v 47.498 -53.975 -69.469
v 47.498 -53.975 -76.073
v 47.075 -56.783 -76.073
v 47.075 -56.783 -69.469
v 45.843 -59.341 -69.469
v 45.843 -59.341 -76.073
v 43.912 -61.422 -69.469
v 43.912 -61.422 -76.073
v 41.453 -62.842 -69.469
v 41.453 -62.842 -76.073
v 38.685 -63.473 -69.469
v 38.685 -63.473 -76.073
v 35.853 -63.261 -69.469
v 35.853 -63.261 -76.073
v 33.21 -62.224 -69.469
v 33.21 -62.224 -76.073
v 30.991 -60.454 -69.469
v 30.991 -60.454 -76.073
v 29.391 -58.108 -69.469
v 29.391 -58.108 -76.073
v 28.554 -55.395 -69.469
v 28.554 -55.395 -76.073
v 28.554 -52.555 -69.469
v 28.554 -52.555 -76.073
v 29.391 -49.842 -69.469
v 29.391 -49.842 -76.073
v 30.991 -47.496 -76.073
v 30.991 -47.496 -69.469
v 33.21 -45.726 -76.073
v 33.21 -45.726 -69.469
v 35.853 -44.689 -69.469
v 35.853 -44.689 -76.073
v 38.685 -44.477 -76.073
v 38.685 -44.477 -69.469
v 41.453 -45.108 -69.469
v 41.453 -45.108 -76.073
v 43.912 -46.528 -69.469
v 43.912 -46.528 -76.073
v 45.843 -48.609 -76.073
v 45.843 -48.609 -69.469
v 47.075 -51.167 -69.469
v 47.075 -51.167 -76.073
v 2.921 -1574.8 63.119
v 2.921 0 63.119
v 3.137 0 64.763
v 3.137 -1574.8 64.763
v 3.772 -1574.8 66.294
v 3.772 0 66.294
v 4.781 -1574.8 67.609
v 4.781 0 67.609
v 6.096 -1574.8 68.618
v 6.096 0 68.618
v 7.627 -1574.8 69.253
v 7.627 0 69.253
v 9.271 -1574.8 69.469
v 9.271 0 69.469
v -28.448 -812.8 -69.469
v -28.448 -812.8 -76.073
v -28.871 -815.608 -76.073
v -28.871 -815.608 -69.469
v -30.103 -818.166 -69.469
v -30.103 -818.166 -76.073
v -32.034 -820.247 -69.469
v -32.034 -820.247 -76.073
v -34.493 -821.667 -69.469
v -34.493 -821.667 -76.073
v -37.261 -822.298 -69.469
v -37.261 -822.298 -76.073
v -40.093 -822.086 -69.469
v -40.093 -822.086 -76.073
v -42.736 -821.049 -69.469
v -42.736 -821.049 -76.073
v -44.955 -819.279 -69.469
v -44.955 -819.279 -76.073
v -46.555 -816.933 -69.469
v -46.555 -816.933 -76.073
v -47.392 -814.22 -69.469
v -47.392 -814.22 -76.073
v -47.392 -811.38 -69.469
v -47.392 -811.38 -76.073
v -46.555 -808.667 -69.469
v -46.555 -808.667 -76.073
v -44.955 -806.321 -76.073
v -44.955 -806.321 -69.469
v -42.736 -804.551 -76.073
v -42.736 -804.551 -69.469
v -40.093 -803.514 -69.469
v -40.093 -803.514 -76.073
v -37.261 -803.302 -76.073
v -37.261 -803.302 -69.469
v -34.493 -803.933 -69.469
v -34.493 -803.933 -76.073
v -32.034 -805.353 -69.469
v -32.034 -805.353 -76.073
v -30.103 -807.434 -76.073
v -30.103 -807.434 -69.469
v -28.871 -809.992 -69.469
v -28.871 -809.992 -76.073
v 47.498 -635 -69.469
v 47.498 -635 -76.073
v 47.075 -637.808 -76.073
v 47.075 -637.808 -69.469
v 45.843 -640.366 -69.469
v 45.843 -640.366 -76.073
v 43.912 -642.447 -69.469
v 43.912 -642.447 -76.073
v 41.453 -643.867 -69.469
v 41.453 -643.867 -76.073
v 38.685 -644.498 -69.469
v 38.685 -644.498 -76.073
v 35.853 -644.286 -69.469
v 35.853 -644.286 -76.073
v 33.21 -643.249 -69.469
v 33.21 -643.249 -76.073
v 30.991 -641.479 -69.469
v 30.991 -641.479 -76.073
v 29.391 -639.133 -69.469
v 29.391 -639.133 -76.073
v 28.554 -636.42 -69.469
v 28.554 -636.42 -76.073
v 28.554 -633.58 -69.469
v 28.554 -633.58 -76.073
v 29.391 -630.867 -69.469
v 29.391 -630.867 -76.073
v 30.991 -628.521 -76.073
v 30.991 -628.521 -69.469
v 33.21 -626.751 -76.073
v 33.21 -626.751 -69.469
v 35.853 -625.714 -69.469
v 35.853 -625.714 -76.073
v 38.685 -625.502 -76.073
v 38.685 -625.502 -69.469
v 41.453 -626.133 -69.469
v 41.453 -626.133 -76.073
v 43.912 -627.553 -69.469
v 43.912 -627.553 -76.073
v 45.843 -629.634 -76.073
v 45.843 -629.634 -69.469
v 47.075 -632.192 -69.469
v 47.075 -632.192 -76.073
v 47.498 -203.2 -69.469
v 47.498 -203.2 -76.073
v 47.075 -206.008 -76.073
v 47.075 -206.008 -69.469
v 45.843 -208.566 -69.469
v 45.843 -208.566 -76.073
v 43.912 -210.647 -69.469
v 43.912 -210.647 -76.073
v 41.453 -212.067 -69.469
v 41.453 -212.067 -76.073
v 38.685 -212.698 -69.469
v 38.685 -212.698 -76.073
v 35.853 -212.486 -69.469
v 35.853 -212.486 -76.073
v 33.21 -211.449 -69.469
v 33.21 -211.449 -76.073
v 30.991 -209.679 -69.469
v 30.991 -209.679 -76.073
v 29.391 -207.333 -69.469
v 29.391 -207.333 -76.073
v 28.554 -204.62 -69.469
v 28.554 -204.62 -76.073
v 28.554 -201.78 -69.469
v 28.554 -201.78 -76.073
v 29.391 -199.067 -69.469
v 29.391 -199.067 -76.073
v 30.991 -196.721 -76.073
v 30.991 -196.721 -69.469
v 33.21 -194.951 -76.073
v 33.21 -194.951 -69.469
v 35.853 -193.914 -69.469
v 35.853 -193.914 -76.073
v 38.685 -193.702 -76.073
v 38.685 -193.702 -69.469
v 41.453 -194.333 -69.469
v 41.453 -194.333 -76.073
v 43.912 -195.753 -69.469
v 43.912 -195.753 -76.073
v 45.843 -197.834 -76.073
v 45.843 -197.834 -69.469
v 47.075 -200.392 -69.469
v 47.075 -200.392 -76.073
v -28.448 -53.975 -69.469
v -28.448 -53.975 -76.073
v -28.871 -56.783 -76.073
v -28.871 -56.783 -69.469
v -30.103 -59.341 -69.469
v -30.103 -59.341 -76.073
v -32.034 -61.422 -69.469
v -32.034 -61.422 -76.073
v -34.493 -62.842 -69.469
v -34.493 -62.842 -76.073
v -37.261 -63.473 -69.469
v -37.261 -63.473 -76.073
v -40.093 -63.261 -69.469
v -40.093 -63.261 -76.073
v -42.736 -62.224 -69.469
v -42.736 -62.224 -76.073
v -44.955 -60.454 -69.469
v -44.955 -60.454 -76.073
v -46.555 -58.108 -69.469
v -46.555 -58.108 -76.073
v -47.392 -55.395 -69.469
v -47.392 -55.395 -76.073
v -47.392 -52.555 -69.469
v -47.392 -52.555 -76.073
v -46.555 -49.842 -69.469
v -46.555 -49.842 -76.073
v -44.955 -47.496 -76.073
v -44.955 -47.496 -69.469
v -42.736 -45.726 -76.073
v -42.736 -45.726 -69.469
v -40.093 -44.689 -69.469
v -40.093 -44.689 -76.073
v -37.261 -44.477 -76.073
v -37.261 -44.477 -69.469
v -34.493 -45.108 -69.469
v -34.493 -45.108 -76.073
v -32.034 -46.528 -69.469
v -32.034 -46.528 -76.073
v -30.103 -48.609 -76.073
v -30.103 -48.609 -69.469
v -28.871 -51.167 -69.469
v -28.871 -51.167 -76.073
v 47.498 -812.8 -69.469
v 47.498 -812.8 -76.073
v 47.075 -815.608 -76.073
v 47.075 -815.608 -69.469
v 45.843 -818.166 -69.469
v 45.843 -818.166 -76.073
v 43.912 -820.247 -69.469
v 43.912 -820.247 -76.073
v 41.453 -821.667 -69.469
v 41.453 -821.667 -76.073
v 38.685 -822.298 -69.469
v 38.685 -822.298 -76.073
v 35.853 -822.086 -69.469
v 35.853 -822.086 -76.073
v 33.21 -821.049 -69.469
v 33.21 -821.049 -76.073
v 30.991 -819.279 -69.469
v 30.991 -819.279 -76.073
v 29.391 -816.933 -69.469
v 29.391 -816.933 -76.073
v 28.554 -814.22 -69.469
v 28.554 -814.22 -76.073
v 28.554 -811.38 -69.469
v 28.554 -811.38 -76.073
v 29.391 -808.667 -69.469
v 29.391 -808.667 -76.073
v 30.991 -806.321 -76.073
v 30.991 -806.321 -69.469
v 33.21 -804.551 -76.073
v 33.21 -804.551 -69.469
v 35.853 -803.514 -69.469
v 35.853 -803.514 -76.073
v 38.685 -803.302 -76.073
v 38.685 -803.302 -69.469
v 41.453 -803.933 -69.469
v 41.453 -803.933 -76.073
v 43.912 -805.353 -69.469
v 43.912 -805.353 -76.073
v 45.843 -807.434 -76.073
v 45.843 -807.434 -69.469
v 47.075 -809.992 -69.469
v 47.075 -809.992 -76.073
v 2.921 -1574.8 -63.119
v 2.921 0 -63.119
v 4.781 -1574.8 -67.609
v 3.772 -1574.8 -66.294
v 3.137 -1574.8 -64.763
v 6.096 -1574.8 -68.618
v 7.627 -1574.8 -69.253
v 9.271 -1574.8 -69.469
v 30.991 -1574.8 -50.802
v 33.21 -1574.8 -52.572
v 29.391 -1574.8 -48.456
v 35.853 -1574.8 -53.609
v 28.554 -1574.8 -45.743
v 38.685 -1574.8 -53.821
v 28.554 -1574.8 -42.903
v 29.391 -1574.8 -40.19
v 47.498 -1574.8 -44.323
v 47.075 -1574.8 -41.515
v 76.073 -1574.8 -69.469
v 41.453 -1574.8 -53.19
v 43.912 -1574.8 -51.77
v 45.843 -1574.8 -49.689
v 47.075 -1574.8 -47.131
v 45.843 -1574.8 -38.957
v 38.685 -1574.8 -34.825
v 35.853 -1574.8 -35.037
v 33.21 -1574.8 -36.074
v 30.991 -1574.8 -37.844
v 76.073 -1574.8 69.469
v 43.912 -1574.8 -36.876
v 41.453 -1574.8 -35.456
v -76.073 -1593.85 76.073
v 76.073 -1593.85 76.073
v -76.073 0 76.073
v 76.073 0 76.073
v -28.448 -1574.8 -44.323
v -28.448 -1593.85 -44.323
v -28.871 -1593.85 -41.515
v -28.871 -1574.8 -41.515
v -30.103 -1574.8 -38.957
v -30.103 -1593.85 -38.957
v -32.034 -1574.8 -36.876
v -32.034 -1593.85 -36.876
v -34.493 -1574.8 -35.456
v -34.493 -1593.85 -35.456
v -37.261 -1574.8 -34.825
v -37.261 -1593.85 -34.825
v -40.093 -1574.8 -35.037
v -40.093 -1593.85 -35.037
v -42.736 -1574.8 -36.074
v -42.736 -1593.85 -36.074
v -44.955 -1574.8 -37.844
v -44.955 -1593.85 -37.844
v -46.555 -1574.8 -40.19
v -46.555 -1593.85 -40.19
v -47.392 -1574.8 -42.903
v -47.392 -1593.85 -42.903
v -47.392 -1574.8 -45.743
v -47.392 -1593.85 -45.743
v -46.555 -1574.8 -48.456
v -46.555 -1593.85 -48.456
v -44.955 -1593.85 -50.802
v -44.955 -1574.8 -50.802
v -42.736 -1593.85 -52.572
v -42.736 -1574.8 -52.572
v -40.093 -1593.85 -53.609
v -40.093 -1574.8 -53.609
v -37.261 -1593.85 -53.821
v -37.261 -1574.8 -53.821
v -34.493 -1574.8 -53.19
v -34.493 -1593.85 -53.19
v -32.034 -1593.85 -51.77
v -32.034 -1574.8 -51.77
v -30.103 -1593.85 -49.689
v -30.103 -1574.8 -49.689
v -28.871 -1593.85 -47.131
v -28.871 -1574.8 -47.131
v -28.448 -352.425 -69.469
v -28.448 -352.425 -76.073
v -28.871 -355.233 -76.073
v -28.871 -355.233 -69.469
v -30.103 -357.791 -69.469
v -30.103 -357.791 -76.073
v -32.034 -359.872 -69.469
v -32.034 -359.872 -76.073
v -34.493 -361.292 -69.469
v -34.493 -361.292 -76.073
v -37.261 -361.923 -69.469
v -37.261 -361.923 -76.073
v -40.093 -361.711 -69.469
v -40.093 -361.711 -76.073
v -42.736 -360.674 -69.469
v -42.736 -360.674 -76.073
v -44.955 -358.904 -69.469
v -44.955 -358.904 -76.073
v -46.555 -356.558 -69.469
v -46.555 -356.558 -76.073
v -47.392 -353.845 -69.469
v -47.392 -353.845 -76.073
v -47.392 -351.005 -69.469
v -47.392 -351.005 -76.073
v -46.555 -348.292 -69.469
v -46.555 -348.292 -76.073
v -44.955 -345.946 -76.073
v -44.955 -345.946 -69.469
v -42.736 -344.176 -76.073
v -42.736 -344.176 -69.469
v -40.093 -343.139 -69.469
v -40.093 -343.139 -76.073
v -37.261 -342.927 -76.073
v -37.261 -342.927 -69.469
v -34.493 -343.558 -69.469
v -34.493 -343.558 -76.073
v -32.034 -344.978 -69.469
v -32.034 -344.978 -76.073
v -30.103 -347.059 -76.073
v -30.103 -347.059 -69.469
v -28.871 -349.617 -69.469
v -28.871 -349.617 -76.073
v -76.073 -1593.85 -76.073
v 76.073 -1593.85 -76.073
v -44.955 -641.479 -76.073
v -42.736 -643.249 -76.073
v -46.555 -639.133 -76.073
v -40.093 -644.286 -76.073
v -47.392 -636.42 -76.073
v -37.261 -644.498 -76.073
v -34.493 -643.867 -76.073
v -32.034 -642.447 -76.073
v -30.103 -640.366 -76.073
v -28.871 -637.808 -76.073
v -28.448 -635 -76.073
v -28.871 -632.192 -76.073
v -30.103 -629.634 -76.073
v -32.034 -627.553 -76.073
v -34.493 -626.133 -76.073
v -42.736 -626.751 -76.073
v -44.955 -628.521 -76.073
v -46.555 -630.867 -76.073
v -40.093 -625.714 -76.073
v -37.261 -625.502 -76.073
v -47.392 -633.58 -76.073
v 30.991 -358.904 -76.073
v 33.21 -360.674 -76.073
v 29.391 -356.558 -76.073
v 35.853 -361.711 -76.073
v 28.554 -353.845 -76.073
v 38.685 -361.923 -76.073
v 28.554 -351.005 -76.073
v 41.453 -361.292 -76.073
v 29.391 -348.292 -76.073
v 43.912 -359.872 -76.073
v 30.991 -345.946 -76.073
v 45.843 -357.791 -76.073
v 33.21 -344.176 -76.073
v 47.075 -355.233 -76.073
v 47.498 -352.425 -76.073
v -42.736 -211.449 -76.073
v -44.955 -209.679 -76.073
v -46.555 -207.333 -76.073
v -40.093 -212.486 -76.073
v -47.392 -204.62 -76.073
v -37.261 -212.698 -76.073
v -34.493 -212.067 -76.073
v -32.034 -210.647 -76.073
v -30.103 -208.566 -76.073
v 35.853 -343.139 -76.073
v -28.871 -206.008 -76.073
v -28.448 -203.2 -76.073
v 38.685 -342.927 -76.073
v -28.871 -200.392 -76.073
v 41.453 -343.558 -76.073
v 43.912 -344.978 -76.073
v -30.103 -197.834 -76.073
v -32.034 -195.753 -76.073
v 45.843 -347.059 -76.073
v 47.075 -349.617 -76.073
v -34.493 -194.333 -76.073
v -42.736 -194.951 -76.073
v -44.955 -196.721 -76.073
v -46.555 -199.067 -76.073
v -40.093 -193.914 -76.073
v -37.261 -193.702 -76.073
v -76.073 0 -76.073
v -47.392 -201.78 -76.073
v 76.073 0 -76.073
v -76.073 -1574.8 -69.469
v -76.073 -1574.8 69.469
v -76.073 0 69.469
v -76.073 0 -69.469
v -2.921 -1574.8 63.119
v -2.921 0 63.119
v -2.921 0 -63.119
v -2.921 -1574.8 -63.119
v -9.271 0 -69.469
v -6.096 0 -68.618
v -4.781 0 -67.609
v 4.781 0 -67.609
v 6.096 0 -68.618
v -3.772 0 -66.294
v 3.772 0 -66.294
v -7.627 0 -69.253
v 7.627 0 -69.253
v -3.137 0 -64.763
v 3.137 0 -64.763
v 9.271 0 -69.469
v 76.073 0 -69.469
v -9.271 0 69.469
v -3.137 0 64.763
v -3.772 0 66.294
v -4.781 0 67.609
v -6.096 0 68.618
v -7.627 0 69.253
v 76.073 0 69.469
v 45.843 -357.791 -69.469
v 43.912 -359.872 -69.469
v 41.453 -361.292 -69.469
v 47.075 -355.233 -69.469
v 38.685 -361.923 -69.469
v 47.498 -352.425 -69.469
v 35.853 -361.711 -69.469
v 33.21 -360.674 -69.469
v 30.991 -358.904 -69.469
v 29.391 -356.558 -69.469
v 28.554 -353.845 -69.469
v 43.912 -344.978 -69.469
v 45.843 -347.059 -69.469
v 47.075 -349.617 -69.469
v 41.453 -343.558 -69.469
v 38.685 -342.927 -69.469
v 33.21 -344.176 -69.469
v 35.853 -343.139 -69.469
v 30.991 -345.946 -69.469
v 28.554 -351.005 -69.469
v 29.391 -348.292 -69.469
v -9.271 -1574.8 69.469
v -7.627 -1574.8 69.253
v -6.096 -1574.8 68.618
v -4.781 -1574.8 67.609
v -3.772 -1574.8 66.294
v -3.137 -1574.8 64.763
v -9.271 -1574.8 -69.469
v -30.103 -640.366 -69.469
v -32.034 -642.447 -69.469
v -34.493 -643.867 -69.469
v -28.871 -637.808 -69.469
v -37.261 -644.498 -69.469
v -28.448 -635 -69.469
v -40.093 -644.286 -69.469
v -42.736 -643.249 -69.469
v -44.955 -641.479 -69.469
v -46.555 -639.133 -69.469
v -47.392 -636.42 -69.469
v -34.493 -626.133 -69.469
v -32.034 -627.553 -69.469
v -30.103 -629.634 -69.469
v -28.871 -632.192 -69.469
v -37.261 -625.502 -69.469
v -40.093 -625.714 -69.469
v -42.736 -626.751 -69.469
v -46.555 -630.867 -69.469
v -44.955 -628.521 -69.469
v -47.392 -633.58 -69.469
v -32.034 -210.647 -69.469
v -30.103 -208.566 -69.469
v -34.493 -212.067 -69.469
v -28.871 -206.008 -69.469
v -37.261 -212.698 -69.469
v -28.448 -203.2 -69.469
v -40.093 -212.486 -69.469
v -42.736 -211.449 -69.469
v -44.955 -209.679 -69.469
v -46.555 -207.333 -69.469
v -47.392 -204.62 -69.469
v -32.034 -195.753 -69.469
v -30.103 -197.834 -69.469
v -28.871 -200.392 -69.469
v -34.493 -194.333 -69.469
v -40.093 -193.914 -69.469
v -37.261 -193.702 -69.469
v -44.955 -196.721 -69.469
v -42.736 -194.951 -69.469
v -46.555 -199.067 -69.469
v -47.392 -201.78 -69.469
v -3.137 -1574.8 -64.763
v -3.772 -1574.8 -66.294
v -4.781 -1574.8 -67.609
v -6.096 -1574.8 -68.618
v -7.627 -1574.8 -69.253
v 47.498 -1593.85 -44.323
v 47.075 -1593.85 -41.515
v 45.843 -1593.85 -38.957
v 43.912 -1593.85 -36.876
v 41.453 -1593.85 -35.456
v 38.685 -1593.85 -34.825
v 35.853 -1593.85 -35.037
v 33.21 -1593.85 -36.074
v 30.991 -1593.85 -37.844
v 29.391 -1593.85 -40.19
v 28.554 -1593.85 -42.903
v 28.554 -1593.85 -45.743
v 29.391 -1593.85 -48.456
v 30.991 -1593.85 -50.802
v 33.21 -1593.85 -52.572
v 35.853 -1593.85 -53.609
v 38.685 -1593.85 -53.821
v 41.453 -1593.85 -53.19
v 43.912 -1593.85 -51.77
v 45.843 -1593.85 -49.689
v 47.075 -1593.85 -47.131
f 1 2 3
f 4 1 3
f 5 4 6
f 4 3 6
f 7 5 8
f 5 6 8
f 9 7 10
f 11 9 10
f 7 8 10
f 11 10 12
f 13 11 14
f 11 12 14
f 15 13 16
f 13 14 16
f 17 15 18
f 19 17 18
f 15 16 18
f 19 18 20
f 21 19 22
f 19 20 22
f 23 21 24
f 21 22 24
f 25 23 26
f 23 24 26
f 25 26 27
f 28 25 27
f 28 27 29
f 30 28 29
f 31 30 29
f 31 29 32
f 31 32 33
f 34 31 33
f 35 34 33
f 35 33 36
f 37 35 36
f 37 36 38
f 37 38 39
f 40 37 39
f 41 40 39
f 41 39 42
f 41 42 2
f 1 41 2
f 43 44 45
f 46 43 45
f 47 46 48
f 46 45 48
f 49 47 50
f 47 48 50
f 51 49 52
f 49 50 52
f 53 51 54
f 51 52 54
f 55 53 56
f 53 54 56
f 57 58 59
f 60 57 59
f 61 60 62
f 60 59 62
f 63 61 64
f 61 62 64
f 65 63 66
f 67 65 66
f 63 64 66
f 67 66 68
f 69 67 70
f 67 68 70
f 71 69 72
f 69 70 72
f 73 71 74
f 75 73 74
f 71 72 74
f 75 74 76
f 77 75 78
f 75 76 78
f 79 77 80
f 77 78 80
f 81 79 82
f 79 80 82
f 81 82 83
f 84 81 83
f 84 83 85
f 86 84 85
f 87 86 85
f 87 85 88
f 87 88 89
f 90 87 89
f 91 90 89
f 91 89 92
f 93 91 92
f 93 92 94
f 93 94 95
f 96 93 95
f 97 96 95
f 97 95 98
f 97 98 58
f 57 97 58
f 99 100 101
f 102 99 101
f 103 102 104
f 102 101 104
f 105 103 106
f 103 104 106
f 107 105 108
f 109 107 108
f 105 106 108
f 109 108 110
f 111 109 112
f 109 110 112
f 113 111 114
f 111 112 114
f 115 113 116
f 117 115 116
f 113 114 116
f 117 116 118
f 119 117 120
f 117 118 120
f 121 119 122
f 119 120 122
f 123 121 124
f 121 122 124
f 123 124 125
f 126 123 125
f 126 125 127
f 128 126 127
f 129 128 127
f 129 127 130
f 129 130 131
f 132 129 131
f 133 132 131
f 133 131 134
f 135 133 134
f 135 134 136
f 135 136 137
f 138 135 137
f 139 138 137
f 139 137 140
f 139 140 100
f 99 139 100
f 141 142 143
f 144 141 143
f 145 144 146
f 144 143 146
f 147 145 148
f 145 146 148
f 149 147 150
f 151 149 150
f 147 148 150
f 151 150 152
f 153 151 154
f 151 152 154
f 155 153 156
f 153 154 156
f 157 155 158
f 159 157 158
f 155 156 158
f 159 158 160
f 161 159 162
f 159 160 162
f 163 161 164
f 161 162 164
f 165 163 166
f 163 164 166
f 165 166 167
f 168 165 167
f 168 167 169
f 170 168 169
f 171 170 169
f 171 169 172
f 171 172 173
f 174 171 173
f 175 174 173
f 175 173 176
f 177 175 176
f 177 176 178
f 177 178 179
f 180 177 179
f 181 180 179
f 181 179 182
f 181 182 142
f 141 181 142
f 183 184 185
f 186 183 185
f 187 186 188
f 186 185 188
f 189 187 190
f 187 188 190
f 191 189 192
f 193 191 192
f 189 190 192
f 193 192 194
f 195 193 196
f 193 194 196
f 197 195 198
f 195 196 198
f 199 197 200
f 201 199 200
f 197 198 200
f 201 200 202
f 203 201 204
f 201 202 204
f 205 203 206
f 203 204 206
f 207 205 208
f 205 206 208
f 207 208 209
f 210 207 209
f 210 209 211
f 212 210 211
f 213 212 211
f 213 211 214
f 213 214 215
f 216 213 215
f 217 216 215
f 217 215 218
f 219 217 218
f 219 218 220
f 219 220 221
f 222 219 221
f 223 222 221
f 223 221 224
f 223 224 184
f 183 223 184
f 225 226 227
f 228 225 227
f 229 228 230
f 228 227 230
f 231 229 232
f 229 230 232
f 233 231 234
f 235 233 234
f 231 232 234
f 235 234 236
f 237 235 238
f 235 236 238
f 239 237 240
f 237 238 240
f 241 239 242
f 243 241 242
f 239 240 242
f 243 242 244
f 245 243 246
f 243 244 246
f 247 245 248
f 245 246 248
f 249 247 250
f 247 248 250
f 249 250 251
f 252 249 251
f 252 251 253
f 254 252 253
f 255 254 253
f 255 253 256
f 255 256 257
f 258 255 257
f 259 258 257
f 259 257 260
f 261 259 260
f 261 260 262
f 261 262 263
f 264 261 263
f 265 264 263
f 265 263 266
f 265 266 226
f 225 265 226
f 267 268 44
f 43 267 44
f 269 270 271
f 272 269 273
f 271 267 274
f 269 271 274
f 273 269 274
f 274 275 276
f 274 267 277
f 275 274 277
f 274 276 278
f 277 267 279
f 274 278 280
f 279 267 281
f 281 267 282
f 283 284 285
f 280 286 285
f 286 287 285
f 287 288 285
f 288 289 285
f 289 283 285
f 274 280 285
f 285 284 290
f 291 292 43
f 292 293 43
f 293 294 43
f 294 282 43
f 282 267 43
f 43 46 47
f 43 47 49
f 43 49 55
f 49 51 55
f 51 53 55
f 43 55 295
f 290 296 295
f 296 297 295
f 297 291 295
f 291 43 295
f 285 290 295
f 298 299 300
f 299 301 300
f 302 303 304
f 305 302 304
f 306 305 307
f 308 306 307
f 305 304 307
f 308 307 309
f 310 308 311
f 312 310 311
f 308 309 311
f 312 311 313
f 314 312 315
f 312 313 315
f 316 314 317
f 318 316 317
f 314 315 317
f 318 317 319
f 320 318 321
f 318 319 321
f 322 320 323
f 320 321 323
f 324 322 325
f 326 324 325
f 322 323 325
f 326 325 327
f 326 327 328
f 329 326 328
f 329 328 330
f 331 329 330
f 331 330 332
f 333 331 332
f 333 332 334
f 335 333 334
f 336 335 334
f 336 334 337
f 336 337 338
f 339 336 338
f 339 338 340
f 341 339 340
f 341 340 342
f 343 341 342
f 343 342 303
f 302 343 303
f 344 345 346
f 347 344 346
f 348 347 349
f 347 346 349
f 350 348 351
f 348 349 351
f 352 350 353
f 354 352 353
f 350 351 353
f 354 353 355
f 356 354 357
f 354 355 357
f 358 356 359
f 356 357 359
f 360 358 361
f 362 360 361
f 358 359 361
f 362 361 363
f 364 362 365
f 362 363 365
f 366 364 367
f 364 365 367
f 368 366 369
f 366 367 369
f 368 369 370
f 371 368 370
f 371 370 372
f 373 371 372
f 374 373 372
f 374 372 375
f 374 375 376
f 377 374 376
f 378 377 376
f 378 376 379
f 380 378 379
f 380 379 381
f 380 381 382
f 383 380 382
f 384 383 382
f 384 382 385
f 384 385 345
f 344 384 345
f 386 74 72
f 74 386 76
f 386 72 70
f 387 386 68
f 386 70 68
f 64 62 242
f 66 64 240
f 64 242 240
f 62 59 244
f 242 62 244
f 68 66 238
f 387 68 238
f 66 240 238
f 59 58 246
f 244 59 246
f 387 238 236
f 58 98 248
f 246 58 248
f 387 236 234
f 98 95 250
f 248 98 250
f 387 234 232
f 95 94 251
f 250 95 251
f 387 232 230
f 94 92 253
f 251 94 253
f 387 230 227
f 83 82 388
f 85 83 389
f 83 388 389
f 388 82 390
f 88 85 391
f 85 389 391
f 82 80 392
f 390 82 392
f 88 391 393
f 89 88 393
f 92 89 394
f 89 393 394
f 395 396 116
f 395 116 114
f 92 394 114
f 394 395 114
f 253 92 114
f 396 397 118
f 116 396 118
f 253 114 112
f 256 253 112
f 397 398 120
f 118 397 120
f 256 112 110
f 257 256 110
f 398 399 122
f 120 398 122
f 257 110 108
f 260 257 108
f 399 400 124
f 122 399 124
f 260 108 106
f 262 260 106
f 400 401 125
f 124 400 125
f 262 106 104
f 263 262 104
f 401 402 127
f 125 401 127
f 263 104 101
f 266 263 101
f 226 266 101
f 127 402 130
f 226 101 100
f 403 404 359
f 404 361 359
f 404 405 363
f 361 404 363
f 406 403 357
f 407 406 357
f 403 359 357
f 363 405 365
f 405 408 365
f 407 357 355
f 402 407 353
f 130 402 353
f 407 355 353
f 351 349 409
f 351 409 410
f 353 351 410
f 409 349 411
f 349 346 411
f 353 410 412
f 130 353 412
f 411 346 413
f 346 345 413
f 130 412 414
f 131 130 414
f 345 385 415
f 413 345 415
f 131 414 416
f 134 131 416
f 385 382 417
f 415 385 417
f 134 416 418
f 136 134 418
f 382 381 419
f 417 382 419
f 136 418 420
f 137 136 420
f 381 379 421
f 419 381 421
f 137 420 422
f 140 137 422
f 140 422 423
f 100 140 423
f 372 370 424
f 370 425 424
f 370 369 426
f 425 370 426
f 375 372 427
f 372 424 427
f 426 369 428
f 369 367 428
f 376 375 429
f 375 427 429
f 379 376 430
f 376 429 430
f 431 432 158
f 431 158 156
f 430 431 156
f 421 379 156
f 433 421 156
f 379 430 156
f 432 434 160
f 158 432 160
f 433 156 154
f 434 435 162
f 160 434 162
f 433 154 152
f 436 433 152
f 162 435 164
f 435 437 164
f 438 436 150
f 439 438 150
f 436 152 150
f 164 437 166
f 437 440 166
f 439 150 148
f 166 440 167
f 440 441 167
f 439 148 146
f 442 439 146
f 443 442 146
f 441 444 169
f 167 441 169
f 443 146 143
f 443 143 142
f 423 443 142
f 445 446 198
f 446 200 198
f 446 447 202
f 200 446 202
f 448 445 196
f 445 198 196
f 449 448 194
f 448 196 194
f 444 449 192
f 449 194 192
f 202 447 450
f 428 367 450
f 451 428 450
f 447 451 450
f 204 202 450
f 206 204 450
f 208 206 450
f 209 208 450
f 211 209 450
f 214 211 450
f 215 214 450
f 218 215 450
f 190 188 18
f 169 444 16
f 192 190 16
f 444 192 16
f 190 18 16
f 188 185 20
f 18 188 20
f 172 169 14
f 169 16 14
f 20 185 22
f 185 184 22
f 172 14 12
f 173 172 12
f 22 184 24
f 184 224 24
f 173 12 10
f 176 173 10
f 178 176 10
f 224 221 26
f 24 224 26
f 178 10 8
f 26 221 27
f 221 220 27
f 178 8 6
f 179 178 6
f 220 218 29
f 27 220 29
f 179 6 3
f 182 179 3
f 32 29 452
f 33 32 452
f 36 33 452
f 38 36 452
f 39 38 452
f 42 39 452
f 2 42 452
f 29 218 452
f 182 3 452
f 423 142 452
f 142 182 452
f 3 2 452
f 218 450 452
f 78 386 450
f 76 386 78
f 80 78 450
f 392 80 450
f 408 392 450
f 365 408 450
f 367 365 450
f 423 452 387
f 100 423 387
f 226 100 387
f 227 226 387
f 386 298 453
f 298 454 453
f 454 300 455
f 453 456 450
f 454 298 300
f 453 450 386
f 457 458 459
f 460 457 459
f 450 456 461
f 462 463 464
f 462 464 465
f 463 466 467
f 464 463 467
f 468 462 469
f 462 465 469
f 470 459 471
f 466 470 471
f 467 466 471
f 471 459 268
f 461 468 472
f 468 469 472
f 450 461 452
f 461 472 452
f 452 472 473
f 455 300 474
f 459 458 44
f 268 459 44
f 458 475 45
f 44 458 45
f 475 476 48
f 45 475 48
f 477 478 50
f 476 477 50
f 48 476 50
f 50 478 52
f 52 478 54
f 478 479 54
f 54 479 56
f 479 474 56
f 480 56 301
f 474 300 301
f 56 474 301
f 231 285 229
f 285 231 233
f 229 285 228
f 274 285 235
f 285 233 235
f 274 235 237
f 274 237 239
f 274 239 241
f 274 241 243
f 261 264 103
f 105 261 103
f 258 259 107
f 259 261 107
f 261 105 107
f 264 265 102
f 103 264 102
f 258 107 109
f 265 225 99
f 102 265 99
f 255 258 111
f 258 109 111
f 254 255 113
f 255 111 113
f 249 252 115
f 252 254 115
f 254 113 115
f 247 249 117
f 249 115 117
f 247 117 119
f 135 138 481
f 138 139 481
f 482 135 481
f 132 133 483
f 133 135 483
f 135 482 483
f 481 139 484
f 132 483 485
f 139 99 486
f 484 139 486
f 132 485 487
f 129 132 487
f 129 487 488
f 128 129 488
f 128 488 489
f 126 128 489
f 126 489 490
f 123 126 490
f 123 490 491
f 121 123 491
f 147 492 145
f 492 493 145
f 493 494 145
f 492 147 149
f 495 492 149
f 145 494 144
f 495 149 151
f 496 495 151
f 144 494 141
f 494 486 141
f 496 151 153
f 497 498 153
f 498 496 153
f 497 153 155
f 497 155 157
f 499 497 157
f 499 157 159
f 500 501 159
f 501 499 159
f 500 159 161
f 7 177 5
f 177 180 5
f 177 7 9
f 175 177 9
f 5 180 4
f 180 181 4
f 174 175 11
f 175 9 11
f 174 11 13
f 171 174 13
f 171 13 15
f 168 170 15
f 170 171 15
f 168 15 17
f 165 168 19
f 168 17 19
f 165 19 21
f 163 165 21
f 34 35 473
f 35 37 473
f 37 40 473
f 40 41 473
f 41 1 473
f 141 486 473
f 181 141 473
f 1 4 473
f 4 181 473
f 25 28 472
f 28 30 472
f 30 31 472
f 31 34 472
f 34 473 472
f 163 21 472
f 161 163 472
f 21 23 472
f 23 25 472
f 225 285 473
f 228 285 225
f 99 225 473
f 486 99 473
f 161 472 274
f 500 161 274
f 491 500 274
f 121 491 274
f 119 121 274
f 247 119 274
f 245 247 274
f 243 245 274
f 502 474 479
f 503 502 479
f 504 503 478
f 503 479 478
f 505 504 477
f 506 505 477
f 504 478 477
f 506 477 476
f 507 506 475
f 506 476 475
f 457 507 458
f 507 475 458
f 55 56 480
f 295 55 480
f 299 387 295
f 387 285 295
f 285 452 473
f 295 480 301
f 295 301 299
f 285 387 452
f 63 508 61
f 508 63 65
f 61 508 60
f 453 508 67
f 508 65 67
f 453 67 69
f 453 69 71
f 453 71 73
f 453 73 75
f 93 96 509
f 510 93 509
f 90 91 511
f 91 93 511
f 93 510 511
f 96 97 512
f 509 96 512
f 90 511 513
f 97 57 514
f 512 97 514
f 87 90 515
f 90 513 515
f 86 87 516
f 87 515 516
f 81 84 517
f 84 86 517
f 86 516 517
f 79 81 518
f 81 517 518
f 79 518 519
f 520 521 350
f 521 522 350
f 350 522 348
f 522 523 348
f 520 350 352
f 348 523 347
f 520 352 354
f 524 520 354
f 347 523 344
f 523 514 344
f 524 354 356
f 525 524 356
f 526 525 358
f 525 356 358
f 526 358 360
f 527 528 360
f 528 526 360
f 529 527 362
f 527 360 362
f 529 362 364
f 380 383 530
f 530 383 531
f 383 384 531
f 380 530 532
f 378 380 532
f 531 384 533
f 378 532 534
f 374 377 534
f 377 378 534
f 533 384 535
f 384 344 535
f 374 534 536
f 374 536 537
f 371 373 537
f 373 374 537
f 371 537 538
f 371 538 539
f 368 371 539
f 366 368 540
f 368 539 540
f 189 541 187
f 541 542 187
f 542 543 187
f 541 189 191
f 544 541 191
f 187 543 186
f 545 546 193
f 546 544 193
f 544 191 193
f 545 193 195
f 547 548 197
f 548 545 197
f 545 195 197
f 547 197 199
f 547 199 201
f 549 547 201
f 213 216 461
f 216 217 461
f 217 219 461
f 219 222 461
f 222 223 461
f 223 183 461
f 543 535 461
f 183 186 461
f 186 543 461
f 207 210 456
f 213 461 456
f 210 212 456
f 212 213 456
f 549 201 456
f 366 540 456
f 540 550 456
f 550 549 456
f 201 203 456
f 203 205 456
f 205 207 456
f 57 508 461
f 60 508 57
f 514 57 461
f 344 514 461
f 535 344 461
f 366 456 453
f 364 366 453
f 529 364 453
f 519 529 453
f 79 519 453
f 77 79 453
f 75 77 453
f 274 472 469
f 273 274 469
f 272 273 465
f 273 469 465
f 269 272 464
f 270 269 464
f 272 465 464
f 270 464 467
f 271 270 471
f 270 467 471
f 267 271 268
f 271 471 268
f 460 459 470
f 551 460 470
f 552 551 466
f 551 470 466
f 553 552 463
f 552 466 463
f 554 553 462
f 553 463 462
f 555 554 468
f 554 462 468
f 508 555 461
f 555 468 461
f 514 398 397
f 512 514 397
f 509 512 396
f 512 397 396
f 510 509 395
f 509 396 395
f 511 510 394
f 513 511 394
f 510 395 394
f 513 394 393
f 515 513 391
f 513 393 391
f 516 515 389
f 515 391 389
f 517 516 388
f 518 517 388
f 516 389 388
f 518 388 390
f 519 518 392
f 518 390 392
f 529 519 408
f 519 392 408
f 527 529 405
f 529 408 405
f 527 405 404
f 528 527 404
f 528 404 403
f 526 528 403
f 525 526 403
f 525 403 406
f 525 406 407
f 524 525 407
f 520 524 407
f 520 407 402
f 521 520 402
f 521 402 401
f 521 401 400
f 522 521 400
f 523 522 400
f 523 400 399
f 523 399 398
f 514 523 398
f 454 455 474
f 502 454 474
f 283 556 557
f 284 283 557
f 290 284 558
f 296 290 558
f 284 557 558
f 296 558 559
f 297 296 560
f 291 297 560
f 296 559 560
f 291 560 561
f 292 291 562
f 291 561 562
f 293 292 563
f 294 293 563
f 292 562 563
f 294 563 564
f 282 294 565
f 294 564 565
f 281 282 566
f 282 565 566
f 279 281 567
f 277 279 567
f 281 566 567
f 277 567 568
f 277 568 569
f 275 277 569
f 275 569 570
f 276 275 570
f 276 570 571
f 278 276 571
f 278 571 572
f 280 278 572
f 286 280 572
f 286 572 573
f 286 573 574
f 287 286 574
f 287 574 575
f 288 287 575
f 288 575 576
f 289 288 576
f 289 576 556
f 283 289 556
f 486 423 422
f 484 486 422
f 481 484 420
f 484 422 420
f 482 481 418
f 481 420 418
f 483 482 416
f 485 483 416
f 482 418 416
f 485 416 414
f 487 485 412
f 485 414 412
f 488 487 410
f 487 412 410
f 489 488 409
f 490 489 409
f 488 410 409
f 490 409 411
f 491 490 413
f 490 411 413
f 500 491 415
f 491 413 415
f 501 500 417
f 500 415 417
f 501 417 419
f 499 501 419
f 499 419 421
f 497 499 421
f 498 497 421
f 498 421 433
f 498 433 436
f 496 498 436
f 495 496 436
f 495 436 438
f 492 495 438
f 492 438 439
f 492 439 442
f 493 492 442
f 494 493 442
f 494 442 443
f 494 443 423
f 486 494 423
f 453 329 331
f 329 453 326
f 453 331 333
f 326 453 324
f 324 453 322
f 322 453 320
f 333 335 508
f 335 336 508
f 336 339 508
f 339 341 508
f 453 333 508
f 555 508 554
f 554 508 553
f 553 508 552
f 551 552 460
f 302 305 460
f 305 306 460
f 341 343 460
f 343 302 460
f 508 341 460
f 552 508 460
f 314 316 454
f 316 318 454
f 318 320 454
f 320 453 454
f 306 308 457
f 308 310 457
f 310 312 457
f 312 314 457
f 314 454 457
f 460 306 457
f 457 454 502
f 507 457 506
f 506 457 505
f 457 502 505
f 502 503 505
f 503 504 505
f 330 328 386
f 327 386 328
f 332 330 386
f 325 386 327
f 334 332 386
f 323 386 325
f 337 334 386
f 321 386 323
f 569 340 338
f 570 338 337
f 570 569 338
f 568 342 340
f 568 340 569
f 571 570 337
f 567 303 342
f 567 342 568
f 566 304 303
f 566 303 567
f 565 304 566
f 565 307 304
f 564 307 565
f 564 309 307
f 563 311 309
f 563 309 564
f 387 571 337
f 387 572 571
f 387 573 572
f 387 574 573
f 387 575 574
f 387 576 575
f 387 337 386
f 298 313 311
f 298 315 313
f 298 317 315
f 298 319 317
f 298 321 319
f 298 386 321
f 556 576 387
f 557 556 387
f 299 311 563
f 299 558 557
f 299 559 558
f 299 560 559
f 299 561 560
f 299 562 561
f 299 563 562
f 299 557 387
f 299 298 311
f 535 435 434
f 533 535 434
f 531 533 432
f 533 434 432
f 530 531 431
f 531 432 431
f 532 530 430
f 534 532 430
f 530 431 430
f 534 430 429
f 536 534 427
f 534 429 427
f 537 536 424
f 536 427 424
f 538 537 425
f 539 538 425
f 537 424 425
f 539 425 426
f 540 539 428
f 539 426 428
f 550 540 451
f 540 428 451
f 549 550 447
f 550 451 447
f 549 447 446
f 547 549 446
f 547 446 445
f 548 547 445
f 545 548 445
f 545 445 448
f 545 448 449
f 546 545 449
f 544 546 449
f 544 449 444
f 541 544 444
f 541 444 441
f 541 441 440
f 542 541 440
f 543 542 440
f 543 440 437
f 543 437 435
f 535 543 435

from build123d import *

# Parameters (mm, degrees)
F1_DEPTH = 1574.8
F3_DEPTH = 19.05
F4_R     = 9.525
F5_DEPTH = 43.942
F6_R     = 9.525
F7_DEPTH = 25.4


with BuildPart() as f1:
    # F0 (on Front) → F1 (new body)
    with BuildSketch(Plane.XZ):
        with BuildLine():
            Line((76.073, 76.073), (-76.073, 76.073))
            Line((-76.073, 76.073), (-76.073, 69.469))
            Line((-76.073, 69.469), (-9.271, 69.469))
            ThreePointArc((-9.271, 69.469), (-4.780872, 67.609128), (-2.921, 63.119))
            Line((-2.921, 63.119), (-2.921, -63.119))
            ThreePointArc((-2.921, -63.119), (-4.780872, -67.609128), (-9.271, -69.469))
            Line((-9.271, -69.469), (-76.073, -69.469))
            Line((-76.073, -69.469), (-76.073, -76.073))
            Line((-76.073, -76.073), (76.073, -76.073))
            Line((76.073, -76.073), (76.073, -69.469))
            Line((76.073, -69.469), (9.271, -69.469))
            ThreePointArc((9.271, -69.469), (4.780872, -67.609128), (2.921, -63.119))
            Line((2.921, -63.119), (2.921, 63.119))
            ThreePointArc((2.921, 63.119), (4.780872, 67.609128), (9.271, 69.469))
            Line((9.271, 69.469), (76.073, 69.469))
            Line((76.073, 69.469), (76.073, 76.073))
        make_face()
    extrude(amount=F1_DEPTH)

    # F2 (on face) → F3 (join)
    with BuildSketch(Plane.XZ.offset(1574.8)):
        with BuildLine():
            Line((-9.271, 69.469), (-76.073, 69.469))
            Line((-76.073, 69.469), (-76.073, -69.469))
            Line((-76.073, -69.469), (-9.271, -69.469))
            ThreePointArc((-9.271, -69.469), (-4.780872, -67.609128), (-2.921, -63.119))
            Line((-2.921, -63.119), (-2.921, 63.119))
            ThreePointArc((-2.921, 63.119), (-4.780872, 67.609128), (-9.271, 69.469))
        make_face()
        with BuildLine():
            Line((76.073, 76.073), (-76.073, 76.073))
            Line((-76.073, 76.073), (-76.073, 69.469))
            Line((-76.073, 69.469), (-9.271, 69.469))
            ThreePointArc((-9.271, 69.469), (-4.780872, 67.609128), (-2.921, 63.119))
            Line((-2.921, 63.119), (-2.921, -63.119))
            ThreePointArc((-2.921, -63.119), (-4.780872, -67.609128), (-9.271, -69.469))
            Line((-9.271, -69.469), (-76.073, -69.469))
            Line((-76.073, -69.469), (-76.073, -76.073))
            Line((-76.073, -76.073), (76.073, -76.073))
            Line((76.073, -76.073), (76.073, -69.469))
            Line((76.073, -69.469), (9.271, -69.469))
            ThreePointArc((9.271, -69.469), (4.780872, -67.609128), (2.921, -63.119))
            Line((2.921, -63.119), (2.921, 63.119))
            ThreePointArc((2.921, 63.119), (4.780872, 67.609128), (9.271, 69.469))
            Line((9.271, 69.469), (76.073, 69.469))
            Line((76.073, 69.469), (76.073, 76.073))
        make_face()
        with BuildLine():
            Line((76.073, -69.469), (76.073, 69.469))
            Line((76.073, 69.469), (9.271, 69.469))
            ThreePointArc((9.271, 69.469), (4.780872, 67.609128), (2.921, 63.119))
            Line((2.921, 63.119), (2.921, -63.119))
            ThreePointArc((2.921, -63.119), (4.780872, -67.609128), (9.271, -69.469))
            Line((9.271, -69.469), (76.073, -69.469))
        make_face()
    extrude(amount=F3_DEPTH)

    # F4 (on face) → F5 (cut)
    with BuildSketch(Plane.XZ.offset(1593.85)):
        with Locations((-37.973, -44.323)):
            Circle(F4_R)
        with Locations((37.973, -44.323)):
            Circle(F4_R)
    extrude(amount=-F5_DEPTH, mode=Mode.SUBTRACT)

    # F6 (on face) → F7 (cut)
    with BuildSketch(Plane(origin=(0, 0, -76.073), x_dir=(1, 0, 0), z_dir=(0, 0, -1))):
        with Locations((-37.973, 812.8)):
            Circle(F6_R)
        with Locations((37.973, 812.8)):
            Circle(F6_R)
        with Locations((-37.973, 635)):
            Circle(F6_R)
        with Locations((37.973, 635)):
            Circle(F6_R)
        with Locations((-37.973, 352.425)):
            Circle(F6_R)
        with Locations((37.973, 352.425)):
            Circle(F6_R)
        with Locations((-37.973, 203.2)):
            Circle(F6_R)
        with Locations((37.973, 203.2)):
            Circle(F6_R)
        with Locations((-37.973, 53.975)):
            Circle(F6_R)
        with Locations((37.973, 53.975)):
            Circle(F6_R)
    extrude(amount=-F7_DEPTH, mode=Mode.SUBTRACT)


solid = f1.part
